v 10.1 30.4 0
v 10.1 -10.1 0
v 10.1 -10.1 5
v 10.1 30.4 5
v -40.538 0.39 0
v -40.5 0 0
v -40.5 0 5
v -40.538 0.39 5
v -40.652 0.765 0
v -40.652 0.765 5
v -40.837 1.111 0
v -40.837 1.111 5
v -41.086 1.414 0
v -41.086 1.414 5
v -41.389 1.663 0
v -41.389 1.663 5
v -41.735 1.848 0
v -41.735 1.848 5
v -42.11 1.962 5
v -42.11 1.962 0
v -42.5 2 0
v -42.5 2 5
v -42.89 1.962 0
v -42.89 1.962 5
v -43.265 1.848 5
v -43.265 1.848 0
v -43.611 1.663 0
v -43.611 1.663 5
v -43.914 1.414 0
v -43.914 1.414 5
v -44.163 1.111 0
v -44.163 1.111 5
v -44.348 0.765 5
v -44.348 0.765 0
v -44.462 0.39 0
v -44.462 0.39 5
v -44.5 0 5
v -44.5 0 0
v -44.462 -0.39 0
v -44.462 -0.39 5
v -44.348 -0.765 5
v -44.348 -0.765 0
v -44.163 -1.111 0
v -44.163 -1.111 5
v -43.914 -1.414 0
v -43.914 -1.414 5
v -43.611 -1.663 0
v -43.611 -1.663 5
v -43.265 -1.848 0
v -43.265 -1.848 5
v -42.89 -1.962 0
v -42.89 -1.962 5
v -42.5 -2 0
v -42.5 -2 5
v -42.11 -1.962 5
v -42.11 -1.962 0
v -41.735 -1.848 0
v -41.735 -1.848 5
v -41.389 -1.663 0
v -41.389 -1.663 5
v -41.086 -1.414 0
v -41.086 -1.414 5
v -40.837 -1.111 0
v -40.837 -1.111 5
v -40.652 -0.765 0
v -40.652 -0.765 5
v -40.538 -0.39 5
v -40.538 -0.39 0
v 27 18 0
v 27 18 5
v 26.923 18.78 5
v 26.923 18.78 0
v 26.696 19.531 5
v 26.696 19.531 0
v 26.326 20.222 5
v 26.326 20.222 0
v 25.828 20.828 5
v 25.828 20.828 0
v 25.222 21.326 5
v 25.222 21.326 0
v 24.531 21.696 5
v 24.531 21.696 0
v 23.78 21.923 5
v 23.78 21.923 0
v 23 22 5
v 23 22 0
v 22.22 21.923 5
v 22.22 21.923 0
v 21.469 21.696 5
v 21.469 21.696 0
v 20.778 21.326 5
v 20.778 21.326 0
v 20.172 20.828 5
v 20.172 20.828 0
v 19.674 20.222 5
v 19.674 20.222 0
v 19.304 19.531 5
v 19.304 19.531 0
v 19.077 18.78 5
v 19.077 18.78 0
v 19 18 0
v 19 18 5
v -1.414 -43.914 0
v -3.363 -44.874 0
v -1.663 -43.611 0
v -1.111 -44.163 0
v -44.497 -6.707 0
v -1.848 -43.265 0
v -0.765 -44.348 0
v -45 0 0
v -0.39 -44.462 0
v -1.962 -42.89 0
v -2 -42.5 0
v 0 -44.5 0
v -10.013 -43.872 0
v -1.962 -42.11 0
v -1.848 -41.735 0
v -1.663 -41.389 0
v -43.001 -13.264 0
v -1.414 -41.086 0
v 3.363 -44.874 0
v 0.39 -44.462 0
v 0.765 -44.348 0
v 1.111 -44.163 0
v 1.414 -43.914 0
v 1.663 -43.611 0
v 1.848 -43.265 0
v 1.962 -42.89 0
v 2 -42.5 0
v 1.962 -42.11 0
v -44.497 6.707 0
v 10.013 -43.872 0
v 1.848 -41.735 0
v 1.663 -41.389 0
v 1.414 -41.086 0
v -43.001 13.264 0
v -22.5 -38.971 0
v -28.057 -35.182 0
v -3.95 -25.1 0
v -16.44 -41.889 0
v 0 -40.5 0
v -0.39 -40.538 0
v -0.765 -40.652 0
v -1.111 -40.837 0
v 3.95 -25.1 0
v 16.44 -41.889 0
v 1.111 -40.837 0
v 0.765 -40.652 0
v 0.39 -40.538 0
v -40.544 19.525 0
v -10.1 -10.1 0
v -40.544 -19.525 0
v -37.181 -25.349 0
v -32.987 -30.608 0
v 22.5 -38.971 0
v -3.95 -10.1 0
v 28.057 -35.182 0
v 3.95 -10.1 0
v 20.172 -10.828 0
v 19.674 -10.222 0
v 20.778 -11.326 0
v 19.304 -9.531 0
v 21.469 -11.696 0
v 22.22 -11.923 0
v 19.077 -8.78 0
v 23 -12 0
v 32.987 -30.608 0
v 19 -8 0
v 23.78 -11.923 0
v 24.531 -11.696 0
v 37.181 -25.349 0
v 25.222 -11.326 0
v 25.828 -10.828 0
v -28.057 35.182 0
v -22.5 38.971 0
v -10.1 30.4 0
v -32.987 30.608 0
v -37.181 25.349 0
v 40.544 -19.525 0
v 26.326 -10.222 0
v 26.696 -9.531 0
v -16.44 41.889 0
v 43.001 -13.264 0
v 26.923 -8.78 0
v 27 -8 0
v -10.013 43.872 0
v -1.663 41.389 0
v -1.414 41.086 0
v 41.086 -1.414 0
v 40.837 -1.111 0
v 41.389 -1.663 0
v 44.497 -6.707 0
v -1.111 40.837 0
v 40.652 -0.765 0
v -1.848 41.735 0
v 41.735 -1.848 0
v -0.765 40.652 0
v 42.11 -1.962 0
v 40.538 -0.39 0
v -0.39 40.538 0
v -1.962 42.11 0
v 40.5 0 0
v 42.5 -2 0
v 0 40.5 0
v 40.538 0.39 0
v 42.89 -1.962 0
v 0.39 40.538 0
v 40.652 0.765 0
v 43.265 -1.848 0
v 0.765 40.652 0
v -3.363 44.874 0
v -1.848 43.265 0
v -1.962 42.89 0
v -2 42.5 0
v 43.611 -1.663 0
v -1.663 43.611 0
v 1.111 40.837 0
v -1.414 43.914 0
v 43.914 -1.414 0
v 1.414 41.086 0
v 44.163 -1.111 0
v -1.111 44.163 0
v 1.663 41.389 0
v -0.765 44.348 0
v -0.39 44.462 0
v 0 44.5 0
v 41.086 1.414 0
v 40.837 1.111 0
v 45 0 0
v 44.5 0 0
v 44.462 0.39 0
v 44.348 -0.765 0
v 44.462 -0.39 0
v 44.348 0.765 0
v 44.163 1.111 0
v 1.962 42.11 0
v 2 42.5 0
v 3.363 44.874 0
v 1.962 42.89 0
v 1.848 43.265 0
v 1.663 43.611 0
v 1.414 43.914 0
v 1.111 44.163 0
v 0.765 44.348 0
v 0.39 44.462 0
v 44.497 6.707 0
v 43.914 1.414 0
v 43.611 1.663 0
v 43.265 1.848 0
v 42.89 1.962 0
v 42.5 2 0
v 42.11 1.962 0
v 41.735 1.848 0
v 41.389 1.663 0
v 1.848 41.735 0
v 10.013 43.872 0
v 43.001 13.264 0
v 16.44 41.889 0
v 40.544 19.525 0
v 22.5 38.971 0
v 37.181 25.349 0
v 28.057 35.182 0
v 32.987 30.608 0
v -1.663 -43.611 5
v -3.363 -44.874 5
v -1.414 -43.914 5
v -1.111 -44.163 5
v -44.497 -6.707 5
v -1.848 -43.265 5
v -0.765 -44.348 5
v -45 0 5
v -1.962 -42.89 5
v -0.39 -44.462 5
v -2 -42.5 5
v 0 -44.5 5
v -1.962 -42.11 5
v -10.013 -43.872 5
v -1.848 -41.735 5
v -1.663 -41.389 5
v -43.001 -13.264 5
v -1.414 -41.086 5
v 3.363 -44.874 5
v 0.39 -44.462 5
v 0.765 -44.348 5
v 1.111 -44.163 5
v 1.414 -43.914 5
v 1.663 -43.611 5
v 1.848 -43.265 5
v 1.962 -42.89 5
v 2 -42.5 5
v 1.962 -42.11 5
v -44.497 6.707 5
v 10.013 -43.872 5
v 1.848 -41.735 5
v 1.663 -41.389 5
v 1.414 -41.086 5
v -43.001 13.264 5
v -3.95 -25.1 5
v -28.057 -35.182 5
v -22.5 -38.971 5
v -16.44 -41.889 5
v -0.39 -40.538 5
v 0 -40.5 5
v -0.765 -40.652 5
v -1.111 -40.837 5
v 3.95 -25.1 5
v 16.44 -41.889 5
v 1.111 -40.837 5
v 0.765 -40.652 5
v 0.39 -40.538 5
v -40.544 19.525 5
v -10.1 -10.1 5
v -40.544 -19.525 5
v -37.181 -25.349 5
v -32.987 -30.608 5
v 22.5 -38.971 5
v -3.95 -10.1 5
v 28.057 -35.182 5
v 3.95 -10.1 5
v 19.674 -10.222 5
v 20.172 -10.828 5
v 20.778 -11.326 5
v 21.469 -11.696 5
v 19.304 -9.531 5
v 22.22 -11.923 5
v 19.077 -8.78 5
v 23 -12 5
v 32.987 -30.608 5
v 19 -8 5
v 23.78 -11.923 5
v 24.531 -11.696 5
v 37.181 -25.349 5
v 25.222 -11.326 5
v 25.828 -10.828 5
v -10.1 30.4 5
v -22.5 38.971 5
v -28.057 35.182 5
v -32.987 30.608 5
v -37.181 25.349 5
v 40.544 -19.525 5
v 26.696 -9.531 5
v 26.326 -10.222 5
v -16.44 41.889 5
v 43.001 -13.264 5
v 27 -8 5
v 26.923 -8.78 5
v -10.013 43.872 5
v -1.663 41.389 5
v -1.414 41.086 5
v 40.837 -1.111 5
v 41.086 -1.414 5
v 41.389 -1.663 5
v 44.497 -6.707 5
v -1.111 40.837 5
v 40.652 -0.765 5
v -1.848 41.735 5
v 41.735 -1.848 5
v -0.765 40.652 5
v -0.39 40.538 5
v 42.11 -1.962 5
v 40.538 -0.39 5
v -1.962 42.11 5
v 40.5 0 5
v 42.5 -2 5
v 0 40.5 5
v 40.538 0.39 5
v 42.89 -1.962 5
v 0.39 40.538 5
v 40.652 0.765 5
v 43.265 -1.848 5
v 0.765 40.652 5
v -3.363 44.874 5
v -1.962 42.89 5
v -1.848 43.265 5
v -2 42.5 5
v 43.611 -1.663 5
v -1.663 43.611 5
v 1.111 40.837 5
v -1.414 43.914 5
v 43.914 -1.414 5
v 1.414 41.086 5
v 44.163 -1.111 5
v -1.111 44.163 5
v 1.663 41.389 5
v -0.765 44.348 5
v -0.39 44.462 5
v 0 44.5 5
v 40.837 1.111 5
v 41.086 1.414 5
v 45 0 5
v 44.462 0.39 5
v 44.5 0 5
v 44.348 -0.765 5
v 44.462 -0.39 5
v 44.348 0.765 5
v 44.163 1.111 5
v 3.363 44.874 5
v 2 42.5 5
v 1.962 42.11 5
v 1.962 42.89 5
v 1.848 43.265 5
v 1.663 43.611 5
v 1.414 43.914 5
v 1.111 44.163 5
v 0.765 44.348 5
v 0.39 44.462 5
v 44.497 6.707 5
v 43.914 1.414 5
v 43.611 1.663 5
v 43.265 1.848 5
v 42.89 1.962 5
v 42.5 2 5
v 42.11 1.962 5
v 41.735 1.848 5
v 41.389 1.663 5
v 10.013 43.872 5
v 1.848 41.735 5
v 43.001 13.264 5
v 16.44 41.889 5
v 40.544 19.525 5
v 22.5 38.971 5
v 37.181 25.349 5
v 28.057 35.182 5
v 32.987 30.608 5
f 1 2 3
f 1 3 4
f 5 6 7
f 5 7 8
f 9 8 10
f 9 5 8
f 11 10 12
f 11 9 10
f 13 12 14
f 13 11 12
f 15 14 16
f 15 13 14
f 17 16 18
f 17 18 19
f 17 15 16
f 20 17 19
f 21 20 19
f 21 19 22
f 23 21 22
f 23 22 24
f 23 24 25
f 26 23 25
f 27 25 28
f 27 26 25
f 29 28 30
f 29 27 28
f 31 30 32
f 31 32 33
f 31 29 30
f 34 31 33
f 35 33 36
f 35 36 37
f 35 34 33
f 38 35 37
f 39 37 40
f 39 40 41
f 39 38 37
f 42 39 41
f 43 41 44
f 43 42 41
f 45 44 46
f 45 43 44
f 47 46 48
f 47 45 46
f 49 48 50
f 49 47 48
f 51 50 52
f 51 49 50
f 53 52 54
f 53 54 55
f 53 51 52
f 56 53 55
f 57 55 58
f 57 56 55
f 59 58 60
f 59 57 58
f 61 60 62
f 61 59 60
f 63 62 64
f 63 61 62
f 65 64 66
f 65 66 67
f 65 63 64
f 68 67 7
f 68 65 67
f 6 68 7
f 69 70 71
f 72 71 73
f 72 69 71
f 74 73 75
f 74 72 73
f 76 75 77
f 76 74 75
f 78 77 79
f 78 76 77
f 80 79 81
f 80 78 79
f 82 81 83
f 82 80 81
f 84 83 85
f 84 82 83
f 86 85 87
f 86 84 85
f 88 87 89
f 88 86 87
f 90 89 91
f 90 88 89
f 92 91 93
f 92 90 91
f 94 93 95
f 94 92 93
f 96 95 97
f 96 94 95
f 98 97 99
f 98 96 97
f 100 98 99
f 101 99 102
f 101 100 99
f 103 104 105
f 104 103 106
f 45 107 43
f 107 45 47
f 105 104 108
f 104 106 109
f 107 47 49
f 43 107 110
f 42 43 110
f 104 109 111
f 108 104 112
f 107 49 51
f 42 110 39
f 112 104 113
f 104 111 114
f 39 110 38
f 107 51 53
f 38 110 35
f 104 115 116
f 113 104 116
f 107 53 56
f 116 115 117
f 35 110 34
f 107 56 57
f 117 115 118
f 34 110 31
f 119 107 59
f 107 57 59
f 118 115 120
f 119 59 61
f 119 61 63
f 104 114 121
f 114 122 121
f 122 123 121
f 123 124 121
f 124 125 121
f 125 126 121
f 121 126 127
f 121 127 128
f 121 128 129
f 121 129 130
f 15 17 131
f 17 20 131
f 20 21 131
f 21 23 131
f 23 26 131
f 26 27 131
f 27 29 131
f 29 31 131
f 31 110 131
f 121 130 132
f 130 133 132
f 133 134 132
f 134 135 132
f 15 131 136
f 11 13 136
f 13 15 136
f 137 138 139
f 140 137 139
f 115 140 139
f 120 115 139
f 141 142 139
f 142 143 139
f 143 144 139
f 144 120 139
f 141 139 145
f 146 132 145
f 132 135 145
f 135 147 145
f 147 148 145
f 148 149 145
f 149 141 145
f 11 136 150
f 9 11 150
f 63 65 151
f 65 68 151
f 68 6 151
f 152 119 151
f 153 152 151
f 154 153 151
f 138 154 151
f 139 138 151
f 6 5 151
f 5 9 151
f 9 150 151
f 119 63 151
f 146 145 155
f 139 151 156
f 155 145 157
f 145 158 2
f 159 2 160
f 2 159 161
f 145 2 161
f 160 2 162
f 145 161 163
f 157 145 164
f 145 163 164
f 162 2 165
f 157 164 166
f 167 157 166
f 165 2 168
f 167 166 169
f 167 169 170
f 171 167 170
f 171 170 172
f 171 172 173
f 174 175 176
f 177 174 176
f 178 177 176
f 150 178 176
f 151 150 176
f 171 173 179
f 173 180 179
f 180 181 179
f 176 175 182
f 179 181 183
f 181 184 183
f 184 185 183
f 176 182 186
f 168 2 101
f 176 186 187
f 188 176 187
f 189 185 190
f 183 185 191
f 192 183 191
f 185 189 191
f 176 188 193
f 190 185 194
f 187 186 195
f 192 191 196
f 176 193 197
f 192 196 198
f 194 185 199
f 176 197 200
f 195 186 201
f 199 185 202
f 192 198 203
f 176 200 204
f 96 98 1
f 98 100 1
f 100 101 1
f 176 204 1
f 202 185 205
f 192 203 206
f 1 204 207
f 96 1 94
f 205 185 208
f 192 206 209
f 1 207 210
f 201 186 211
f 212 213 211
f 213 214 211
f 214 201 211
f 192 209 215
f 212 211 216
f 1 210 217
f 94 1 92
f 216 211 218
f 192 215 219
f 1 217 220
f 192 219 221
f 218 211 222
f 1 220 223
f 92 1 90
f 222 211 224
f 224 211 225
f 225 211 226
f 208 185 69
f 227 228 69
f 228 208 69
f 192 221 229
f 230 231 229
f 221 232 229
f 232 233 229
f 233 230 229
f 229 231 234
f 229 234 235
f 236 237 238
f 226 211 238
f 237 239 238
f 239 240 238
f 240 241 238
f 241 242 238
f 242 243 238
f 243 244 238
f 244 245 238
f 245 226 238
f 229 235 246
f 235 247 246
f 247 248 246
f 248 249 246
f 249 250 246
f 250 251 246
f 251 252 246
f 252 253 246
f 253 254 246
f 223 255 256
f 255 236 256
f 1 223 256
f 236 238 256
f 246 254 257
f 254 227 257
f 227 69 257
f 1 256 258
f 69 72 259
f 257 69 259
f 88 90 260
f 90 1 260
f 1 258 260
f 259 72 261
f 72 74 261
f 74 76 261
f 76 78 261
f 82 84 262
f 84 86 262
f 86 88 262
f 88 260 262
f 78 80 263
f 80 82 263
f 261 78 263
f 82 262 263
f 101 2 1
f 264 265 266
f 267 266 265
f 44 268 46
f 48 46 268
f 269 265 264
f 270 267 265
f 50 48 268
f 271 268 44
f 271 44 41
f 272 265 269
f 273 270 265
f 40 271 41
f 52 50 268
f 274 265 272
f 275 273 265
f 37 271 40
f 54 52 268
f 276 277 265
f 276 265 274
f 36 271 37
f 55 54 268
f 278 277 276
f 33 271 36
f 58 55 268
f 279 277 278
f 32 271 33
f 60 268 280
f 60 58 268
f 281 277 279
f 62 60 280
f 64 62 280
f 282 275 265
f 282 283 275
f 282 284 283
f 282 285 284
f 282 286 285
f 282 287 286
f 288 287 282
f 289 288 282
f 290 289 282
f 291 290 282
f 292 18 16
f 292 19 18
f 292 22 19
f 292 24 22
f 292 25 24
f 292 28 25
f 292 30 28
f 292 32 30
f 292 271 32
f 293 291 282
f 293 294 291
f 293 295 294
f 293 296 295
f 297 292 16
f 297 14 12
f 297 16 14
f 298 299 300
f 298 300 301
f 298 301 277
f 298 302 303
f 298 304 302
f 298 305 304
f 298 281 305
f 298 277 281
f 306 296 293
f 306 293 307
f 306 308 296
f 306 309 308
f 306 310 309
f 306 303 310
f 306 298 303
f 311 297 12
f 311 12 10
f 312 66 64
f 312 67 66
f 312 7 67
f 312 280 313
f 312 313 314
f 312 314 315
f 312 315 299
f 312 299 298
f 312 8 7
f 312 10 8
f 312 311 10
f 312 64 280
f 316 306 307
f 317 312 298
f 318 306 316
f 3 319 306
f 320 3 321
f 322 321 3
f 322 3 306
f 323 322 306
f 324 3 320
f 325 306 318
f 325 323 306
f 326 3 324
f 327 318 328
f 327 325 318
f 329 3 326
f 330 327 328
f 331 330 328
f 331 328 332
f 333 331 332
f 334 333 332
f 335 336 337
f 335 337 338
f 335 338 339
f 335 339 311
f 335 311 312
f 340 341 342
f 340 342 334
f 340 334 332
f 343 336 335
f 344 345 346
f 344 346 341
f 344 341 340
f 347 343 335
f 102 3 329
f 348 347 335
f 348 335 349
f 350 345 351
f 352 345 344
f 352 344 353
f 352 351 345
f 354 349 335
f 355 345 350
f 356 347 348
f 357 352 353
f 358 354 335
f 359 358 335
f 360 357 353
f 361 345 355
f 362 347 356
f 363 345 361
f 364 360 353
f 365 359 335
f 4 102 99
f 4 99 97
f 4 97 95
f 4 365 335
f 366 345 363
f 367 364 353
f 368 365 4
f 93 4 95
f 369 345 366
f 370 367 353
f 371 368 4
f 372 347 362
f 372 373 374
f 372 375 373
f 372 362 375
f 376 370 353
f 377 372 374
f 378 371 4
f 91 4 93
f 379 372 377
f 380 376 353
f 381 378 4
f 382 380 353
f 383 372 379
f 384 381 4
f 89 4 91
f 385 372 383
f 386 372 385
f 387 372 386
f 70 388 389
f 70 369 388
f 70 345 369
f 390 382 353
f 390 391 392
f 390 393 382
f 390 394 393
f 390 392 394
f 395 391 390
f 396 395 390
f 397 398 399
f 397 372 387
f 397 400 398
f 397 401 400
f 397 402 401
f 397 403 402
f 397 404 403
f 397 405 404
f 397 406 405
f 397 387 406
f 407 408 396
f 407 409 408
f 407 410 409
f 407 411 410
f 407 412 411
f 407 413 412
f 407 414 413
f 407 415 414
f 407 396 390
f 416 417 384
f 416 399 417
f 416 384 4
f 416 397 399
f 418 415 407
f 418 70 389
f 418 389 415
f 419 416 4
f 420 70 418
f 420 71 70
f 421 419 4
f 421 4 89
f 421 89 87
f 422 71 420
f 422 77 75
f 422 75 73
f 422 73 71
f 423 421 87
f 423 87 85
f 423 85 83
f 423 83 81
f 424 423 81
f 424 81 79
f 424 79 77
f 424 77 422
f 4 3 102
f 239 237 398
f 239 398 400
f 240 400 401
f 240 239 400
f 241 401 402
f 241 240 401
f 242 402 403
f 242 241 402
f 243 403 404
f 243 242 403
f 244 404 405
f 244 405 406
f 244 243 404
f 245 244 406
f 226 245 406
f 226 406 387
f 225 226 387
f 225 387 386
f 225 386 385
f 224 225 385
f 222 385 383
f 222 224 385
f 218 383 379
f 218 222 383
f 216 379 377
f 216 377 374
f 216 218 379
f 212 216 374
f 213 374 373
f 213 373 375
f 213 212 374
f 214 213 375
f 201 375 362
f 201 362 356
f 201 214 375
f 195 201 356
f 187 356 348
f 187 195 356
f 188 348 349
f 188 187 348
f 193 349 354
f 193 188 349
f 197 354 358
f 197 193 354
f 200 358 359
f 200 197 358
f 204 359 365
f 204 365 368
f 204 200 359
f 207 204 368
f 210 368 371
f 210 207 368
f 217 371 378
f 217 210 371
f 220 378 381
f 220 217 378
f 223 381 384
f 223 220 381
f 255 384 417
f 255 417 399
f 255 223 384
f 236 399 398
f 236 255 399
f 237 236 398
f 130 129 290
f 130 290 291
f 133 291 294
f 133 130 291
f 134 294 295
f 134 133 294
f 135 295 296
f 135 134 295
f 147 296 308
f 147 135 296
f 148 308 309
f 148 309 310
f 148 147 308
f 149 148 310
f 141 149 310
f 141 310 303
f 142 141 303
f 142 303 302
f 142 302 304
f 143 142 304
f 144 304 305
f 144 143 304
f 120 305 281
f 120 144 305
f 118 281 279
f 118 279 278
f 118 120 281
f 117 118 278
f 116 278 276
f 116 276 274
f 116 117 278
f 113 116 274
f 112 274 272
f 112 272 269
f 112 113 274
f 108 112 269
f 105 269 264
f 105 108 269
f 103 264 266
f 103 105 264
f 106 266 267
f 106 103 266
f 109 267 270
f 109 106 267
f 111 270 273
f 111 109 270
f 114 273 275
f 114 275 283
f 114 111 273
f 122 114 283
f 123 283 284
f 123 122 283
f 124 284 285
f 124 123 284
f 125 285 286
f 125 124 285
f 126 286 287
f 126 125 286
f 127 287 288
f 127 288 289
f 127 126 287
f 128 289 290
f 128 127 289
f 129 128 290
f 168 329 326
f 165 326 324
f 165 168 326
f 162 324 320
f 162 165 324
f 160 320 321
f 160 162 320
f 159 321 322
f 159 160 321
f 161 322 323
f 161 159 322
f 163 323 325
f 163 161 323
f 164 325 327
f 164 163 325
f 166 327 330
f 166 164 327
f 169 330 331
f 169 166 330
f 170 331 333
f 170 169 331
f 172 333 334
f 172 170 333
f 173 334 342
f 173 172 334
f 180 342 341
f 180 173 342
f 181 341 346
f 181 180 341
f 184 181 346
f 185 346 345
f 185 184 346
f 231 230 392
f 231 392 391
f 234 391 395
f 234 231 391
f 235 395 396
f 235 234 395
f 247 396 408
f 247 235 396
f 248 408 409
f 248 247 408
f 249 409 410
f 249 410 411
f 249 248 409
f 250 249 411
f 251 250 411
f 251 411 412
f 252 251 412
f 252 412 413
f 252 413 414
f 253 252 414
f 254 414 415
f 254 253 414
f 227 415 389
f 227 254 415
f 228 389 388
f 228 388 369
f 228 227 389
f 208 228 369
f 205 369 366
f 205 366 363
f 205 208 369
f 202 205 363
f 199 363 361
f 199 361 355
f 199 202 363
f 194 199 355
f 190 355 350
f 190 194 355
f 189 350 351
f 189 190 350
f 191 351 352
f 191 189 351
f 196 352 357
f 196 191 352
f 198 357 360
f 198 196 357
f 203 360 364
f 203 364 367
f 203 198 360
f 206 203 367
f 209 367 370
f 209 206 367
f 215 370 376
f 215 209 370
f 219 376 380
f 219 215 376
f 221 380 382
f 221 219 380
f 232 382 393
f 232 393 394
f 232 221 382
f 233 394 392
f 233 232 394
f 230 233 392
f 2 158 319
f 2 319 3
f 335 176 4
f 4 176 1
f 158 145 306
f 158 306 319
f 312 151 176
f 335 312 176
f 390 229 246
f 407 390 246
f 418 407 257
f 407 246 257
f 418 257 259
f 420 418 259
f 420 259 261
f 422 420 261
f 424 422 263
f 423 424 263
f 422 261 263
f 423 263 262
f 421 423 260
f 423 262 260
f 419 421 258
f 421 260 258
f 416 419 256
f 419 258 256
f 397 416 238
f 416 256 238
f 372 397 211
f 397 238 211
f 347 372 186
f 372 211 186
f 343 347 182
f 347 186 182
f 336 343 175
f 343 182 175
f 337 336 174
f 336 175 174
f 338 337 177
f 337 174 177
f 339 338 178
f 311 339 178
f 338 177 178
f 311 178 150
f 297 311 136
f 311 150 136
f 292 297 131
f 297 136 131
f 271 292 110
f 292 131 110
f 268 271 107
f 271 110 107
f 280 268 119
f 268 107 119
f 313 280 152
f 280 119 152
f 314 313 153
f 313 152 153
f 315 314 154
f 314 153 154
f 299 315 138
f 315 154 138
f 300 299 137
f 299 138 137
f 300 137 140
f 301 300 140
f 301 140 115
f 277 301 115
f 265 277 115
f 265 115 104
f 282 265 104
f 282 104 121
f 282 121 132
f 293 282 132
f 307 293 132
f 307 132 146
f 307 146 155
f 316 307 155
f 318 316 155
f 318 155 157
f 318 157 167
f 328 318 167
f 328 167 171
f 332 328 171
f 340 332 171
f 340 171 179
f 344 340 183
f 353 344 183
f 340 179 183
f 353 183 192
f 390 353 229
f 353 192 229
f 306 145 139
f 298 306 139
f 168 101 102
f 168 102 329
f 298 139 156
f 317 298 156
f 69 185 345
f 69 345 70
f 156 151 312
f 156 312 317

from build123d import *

# Parameters (mm, degrees)
SKETCH1_R           = 45
SKETCH1_R_2         = 2
SKETCH1_W           = 20.2
SKETCH1_H           = 40.5
BOSS_EXTRUDE1_DEPTH = 5
SKETCH2_W           = 7.9
SKETCH2_H           = 15
CUT_EXTRUDE1_DEPTH  = 10
CUT_EXTRUDE2_DEPTH  = 10


with BuildPart() as part:
    # Sketch1 → Boss-Extrude1 (new body)
    with BuildSketch(Plane.XY):
        Circle(SKETCH1_R)
        with Locations((42.5, 0)):
            Circle(SKETCH1_R_2, mode=Mode.SUBTRACT)
        with Locations((0, -42.5)):
            Circle(SKETCH1_R_2, mode=Mode.SUBTRACT)
        with Locations((-42.5, 0)):
            Circle(SKETCH1_R_2, mode=Mode.SUBTRACT)
        with Locations((0, 42.5)):
            Circle(SKETCH1_R_2, mode=Mode.SUBTRACT)
        with Locations((0, 10.15)):
            Rectangle(SKETCH1_W, SKETCH1_H, mode=Mode.SUBTRACT)
    extrude(amount=BOSS_EXTRUDE1_DEPTH)

    # Sketch2 → Cut-Extrude1 (cut)
    with BuildSketch(Plane(origin=(0, 0, 0), x_dir=(-1, 0, 0), z_dir=(0, 0, -1))):
        with Locations((0, -17.6)):
            Rectangle(SKETCH2_W, SKETCH2_H)
    extrude(amount=-CUT_EXTRUDE1_DEPTH, mode=Mode.SUBTRACT)

    # Sketch3 → Cut-Extrude2 (cut)
    with BuildSketch(Plane(origin=(0, 0, 0), x_dir=(-1, 0, 0), z_dir=(0, 0, -1))):
        with BuildLine():
            Line((-19, 18), (-19, -8))
            ThreePointArc((-19, -8), (-23, -12), (-27, -8))
            Line((-27, -8), (-27, 18))
            ThreePointArc((-27, 18), (-23, 22), (-19, 18))
        make_face()
    extrude(amount=-CUT_EXTRUDE2_DEPTH, mode=Mode.SUBTRACT)


solid = part.part
